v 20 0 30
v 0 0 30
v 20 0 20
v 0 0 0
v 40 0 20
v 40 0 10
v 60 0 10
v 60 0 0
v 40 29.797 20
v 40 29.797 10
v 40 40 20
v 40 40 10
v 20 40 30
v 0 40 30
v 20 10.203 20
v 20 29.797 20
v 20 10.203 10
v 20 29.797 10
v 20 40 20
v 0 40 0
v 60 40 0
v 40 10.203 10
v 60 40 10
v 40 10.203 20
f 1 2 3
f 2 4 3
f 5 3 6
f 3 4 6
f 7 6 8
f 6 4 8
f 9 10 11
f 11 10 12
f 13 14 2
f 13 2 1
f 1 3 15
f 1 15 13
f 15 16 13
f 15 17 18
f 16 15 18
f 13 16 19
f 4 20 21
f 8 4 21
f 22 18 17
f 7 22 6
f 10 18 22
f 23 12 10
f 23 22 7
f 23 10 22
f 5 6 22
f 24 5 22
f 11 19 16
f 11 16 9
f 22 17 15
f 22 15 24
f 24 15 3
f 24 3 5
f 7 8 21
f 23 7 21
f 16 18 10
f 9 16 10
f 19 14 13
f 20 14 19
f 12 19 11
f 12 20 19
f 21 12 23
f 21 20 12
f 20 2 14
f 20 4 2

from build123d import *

# Parameters (mm, degrees)
F0_W     = 60
F0_H     = 40
F1_DEPTH = 10
F2_W     = 20
F2_H     = 40
F3_DEPTH = 20
F4_W     = 20
F4_H     = 10.2027570456
F5_DEPTH = 10
F6_DEPTH = 10


with BuildPart() as f1:
    # F0 (on Top) → F1 (new body)
    with BuildSketch(Plane.XY):
        with Locations((30, 20)):
            Rectangle(F0_W, F0_H)
    extrude(amount=F1_DEPTH)

    # F2 (on face) → F3 (join)
    with BuildSketch(Plane.XY.offset(10)):
        with Locations((10, 20)):
            Rectangle(F2_W, F2_H)
    extrude(amount=F3_DEPTH)

    # F4 (on face) → F5 (join)
    with BuildSketch(Plane.XY.offset(10)):
        with Locations((30, 34.8986214772)):
            Rectangle(F4_W, F4_H)
        with Locations((30, 5.1013785228)):
            Rectangle(F4_W, F4_H)
    extrude(amount=F5_DEPTH)

    # F4 (on face) → F6 (join)
    with BuildSketch(Plane.XY.offset(10)):
        with Locations((30, 34.8986214772)):
            Rectangle(F4_W, F4_H)
    extrude(amount=F6_DEPTH)


solid = f1.part
